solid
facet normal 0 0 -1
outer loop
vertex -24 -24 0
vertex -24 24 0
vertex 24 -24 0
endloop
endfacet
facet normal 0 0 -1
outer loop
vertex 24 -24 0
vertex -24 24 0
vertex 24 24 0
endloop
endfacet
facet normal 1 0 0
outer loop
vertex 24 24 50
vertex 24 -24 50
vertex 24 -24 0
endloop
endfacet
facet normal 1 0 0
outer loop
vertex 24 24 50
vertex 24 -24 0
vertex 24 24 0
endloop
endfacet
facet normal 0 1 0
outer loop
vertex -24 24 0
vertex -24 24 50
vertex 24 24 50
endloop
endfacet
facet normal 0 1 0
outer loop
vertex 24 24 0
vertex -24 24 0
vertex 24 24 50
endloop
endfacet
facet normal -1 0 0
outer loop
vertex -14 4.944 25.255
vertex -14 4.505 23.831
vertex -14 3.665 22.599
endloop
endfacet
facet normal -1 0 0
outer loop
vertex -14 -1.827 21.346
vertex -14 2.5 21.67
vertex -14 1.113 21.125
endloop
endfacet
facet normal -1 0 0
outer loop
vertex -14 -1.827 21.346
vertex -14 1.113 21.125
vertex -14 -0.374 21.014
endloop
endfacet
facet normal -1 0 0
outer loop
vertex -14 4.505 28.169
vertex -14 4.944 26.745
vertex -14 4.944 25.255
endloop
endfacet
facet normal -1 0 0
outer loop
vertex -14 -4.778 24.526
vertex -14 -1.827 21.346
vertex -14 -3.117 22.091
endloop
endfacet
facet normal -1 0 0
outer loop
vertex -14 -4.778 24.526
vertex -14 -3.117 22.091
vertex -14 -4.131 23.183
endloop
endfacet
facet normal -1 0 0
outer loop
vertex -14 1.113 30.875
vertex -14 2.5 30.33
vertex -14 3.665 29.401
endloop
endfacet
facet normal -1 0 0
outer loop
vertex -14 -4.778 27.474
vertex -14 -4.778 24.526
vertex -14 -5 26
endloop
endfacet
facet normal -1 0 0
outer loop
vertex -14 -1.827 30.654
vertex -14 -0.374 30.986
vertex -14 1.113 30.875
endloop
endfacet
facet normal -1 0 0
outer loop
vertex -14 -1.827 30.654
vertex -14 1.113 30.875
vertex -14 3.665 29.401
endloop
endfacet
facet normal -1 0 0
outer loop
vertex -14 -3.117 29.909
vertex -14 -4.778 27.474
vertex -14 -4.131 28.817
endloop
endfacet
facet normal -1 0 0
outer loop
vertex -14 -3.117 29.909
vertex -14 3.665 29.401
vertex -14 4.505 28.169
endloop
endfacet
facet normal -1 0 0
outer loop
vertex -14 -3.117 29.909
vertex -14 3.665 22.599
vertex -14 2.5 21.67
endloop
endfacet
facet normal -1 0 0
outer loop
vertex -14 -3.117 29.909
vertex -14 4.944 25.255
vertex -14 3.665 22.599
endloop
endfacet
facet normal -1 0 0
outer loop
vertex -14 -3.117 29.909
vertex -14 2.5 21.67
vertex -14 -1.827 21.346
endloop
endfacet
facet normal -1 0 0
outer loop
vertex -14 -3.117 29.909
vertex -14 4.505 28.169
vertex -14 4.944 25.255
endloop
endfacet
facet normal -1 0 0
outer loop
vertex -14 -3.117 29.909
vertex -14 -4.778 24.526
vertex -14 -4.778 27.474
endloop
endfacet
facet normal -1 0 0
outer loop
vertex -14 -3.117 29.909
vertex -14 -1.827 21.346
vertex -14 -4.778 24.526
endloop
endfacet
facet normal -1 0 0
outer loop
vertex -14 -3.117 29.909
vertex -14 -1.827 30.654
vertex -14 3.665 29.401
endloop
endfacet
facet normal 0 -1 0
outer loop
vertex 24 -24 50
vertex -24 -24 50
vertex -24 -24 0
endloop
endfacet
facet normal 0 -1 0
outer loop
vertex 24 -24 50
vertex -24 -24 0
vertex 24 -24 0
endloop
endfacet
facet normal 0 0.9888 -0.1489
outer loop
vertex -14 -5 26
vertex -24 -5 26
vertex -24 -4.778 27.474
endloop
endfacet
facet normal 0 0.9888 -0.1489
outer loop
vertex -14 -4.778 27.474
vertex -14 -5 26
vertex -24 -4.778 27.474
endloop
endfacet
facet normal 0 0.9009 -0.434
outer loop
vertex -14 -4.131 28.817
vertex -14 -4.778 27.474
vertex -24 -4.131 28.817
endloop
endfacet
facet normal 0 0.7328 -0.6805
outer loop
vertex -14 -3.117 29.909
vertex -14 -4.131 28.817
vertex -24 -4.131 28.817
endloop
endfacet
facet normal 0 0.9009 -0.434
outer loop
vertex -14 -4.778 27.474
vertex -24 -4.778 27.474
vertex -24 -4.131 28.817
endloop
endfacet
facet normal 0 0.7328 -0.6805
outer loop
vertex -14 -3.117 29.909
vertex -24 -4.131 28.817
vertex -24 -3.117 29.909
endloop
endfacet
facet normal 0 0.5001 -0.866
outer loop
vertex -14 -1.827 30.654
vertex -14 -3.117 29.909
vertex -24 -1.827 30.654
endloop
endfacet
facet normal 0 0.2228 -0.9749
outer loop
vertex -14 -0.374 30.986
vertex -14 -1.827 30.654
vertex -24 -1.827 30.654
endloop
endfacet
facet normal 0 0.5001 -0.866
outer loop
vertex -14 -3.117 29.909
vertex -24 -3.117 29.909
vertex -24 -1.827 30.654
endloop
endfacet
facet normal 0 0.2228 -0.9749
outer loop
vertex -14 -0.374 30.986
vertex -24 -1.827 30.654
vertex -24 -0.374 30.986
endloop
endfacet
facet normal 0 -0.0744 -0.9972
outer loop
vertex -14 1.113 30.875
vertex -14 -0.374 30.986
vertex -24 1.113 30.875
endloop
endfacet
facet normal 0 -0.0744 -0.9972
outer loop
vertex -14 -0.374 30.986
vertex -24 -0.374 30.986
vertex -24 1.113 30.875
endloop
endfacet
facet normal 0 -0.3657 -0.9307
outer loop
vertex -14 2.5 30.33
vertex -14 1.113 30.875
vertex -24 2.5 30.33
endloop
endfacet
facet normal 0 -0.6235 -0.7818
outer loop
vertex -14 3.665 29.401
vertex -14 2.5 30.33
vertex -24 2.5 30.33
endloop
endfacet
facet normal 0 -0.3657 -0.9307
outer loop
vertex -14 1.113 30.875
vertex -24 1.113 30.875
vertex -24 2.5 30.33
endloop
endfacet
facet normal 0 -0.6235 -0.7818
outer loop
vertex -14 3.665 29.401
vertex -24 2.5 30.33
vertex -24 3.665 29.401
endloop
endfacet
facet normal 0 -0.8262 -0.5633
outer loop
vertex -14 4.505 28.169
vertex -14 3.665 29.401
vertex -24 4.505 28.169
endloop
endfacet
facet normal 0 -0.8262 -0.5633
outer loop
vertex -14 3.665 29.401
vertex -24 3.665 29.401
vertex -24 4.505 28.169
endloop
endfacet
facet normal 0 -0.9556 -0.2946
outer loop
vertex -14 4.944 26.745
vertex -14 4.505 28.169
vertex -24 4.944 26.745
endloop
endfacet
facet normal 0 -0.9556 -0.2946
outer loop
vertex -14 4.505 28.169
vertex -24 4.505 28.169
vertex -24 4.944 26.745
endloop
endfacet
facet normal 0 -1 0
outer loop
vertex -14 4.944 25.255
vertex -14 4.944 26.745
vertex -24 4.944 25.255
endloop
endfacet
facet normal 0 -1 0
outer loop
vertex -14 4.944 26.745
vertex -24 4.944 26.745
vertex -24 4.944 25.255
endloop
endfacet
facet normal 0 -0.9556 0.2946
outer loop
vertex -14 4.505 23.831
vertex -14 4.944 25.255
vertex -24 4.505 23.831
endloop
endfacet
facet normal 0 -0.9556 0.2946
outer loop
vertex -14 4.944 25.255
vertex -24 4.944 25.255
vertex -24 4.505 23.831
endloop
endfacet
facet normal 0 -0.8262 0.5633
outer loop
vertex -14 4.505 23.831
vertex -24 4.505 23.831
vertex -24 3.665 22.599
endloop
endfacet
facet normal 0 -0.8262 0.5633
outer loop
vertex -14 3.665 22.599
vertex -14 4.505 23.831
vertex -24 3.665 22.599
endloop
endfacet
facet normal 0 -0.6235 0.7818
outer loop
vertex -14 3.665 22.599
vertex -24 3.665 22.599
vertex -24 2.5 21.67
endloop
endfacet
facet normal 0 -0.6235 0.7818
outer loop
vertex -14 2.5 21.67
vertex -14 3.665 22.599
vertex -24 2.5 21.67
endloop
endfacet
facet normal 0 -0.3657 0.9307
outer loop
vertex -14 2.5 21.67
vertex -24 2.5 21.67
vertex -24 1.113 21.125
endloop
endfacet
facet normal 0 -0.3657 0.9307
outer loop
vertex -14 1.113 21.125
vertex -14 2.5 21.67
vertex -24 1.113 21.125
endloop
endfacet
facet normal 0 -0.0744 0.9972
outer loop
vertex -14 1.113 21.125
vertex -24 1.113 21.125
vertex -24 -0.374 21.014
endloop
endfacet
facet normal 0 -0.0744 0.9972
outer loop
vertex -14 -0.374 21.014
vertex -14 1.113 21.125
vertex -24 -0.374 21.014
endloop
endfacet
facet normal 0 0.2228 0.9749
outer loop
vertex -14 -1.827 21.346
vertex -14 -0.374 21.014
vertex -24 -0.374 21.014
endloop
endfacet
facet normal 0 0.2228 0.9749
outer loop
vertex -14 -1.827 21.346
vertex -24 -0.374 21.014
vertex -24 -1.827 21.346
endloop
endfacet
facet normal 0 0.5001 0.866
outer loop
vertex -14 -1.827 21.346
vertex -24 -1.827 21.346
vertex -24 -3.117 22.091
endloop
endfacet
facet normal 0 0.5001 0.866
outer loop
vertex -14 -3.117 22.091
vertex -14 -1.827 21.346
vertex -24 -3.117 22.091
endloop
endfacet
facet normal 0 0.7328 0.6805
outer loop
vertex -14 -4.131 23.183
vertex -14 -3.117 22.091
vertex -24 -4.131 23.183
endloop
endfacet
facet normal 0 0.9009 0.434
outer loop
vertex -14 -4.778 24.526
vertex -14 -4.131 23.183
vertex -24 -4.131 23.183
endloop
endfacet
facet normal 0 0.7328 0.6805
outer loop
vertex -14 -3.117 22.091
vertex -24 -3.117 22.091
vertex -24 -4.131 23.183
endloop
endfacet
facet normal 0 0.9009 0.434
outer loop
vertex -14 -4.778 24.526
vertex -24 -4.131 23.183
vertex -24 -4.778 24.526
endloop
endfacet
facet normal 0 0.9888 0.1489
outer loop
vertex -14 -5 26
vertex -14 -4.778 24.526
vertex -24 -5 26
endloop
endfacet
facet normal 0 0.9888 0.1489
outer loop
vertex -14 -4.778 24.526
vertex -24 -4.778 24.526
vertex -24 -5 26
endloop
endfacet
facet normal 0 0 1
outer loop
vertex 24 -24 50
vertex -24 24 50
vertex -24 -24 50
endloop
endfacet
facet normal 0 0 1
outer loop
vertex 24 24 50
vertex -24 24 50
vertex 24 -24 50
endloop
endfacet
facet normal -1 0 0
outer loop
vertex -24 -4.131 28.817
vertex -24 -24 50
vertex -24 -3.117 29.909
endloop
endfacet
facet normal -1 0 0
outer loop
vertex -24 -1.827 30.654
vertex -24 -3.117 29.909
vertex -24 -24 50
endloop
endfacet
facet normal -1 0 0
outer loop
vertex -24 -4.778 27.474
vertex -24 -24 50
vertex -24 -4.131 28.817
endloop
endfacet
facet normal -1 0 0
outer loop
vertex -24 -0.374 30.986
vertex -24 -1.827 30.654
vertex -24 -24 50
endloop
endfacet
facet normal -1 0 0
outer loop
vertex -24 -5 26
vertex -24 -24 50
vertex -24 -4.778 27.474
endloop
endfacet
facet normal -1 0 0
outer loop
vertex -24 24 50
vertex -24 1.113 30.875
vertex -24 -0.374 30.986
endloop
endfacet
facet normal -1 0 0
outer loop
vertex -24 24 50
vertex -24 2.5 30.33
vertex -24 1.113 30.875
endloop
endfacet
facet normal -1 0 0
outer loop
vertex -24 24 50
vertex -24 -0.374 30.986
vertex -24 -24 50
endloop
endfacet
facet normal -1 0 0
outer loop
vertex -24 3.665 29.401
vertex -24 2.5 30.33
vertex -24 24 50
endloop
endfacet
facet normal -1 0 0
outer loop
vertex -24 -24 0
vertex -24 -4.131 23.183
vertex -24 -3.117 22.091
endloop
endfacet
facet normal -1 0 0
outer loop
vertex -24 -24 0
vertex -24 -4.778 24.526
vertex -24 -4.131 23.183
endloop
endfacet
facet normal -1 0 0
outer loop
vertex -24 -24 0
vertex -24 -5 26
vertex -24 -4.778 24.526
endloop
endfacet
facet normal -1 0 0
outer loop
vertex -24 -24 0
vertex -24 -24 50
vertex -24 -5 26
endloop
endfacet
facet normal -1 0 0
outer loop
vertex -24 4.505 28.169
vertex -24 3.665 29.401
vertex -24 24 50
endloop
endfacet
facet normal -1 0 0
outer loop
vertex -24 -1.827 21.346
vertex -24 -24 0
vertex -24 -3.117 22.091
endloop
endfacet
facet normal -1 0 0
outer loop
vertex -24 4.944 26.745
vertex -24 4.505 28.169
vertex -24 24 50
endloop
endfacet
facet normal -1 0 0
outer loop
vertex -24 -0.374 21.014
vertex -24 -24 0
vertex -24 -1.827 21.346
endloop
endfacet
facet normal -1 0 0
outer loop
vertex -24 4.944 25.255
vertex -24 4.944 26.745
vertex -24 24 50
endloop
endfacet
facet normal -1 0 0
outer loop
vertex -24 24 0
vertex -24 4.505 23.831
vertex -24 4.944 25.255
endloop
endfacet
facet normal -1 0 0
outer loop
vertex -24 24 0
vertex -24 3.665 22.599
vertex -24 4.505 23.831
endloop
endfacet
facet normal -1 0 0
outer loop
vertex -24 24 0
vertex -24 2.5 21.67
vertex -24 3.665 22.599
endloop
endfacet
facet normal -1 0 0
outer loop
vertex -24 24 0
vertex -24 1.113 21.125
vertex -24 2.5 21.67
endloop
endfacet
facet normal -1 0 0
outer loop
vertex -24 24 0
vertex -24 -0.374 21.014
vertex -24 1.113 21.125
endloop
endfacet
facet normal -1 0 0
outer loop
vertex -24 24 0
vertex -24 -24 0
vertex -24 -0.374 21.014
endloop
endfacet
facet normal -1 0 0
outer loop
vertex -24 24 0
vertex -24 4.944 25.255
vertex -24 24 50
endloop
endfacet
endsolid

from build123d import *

# Parameters (mm, degrees)
CROQUIS1_W              = 48
CROQUIS1_H              = 48
SALIENTE_EXTRUIR1_DEPTH = 50
CROQUIS3_R              = 5
CORTAR_EXTRUIR2_DEPTH   = 10


with BuildPart() as part:
    # Croquis1 → Saliente-Extruir1 (new body)
    with BuildSketch(Plane.XY):
        Rectangle(CROQUIS1_W, CROQUIS1_H)
    extrude(amount=SALIENTE_EXTRUIR1_DEPTH)

    # Croquis3 → Cortar-Extruir2 (cut)
    with BuildSketch(Plane.ZY.offset(24)):
        with Locations(Location((26, 0, 0), (0, 0, 270))):
            Circle(CROQUIS3_R)
    extrude(amount=-CORTAR_EXTRUIR2_DEPTH, mode=Mode.SUBTRACT)


solid = part.part
